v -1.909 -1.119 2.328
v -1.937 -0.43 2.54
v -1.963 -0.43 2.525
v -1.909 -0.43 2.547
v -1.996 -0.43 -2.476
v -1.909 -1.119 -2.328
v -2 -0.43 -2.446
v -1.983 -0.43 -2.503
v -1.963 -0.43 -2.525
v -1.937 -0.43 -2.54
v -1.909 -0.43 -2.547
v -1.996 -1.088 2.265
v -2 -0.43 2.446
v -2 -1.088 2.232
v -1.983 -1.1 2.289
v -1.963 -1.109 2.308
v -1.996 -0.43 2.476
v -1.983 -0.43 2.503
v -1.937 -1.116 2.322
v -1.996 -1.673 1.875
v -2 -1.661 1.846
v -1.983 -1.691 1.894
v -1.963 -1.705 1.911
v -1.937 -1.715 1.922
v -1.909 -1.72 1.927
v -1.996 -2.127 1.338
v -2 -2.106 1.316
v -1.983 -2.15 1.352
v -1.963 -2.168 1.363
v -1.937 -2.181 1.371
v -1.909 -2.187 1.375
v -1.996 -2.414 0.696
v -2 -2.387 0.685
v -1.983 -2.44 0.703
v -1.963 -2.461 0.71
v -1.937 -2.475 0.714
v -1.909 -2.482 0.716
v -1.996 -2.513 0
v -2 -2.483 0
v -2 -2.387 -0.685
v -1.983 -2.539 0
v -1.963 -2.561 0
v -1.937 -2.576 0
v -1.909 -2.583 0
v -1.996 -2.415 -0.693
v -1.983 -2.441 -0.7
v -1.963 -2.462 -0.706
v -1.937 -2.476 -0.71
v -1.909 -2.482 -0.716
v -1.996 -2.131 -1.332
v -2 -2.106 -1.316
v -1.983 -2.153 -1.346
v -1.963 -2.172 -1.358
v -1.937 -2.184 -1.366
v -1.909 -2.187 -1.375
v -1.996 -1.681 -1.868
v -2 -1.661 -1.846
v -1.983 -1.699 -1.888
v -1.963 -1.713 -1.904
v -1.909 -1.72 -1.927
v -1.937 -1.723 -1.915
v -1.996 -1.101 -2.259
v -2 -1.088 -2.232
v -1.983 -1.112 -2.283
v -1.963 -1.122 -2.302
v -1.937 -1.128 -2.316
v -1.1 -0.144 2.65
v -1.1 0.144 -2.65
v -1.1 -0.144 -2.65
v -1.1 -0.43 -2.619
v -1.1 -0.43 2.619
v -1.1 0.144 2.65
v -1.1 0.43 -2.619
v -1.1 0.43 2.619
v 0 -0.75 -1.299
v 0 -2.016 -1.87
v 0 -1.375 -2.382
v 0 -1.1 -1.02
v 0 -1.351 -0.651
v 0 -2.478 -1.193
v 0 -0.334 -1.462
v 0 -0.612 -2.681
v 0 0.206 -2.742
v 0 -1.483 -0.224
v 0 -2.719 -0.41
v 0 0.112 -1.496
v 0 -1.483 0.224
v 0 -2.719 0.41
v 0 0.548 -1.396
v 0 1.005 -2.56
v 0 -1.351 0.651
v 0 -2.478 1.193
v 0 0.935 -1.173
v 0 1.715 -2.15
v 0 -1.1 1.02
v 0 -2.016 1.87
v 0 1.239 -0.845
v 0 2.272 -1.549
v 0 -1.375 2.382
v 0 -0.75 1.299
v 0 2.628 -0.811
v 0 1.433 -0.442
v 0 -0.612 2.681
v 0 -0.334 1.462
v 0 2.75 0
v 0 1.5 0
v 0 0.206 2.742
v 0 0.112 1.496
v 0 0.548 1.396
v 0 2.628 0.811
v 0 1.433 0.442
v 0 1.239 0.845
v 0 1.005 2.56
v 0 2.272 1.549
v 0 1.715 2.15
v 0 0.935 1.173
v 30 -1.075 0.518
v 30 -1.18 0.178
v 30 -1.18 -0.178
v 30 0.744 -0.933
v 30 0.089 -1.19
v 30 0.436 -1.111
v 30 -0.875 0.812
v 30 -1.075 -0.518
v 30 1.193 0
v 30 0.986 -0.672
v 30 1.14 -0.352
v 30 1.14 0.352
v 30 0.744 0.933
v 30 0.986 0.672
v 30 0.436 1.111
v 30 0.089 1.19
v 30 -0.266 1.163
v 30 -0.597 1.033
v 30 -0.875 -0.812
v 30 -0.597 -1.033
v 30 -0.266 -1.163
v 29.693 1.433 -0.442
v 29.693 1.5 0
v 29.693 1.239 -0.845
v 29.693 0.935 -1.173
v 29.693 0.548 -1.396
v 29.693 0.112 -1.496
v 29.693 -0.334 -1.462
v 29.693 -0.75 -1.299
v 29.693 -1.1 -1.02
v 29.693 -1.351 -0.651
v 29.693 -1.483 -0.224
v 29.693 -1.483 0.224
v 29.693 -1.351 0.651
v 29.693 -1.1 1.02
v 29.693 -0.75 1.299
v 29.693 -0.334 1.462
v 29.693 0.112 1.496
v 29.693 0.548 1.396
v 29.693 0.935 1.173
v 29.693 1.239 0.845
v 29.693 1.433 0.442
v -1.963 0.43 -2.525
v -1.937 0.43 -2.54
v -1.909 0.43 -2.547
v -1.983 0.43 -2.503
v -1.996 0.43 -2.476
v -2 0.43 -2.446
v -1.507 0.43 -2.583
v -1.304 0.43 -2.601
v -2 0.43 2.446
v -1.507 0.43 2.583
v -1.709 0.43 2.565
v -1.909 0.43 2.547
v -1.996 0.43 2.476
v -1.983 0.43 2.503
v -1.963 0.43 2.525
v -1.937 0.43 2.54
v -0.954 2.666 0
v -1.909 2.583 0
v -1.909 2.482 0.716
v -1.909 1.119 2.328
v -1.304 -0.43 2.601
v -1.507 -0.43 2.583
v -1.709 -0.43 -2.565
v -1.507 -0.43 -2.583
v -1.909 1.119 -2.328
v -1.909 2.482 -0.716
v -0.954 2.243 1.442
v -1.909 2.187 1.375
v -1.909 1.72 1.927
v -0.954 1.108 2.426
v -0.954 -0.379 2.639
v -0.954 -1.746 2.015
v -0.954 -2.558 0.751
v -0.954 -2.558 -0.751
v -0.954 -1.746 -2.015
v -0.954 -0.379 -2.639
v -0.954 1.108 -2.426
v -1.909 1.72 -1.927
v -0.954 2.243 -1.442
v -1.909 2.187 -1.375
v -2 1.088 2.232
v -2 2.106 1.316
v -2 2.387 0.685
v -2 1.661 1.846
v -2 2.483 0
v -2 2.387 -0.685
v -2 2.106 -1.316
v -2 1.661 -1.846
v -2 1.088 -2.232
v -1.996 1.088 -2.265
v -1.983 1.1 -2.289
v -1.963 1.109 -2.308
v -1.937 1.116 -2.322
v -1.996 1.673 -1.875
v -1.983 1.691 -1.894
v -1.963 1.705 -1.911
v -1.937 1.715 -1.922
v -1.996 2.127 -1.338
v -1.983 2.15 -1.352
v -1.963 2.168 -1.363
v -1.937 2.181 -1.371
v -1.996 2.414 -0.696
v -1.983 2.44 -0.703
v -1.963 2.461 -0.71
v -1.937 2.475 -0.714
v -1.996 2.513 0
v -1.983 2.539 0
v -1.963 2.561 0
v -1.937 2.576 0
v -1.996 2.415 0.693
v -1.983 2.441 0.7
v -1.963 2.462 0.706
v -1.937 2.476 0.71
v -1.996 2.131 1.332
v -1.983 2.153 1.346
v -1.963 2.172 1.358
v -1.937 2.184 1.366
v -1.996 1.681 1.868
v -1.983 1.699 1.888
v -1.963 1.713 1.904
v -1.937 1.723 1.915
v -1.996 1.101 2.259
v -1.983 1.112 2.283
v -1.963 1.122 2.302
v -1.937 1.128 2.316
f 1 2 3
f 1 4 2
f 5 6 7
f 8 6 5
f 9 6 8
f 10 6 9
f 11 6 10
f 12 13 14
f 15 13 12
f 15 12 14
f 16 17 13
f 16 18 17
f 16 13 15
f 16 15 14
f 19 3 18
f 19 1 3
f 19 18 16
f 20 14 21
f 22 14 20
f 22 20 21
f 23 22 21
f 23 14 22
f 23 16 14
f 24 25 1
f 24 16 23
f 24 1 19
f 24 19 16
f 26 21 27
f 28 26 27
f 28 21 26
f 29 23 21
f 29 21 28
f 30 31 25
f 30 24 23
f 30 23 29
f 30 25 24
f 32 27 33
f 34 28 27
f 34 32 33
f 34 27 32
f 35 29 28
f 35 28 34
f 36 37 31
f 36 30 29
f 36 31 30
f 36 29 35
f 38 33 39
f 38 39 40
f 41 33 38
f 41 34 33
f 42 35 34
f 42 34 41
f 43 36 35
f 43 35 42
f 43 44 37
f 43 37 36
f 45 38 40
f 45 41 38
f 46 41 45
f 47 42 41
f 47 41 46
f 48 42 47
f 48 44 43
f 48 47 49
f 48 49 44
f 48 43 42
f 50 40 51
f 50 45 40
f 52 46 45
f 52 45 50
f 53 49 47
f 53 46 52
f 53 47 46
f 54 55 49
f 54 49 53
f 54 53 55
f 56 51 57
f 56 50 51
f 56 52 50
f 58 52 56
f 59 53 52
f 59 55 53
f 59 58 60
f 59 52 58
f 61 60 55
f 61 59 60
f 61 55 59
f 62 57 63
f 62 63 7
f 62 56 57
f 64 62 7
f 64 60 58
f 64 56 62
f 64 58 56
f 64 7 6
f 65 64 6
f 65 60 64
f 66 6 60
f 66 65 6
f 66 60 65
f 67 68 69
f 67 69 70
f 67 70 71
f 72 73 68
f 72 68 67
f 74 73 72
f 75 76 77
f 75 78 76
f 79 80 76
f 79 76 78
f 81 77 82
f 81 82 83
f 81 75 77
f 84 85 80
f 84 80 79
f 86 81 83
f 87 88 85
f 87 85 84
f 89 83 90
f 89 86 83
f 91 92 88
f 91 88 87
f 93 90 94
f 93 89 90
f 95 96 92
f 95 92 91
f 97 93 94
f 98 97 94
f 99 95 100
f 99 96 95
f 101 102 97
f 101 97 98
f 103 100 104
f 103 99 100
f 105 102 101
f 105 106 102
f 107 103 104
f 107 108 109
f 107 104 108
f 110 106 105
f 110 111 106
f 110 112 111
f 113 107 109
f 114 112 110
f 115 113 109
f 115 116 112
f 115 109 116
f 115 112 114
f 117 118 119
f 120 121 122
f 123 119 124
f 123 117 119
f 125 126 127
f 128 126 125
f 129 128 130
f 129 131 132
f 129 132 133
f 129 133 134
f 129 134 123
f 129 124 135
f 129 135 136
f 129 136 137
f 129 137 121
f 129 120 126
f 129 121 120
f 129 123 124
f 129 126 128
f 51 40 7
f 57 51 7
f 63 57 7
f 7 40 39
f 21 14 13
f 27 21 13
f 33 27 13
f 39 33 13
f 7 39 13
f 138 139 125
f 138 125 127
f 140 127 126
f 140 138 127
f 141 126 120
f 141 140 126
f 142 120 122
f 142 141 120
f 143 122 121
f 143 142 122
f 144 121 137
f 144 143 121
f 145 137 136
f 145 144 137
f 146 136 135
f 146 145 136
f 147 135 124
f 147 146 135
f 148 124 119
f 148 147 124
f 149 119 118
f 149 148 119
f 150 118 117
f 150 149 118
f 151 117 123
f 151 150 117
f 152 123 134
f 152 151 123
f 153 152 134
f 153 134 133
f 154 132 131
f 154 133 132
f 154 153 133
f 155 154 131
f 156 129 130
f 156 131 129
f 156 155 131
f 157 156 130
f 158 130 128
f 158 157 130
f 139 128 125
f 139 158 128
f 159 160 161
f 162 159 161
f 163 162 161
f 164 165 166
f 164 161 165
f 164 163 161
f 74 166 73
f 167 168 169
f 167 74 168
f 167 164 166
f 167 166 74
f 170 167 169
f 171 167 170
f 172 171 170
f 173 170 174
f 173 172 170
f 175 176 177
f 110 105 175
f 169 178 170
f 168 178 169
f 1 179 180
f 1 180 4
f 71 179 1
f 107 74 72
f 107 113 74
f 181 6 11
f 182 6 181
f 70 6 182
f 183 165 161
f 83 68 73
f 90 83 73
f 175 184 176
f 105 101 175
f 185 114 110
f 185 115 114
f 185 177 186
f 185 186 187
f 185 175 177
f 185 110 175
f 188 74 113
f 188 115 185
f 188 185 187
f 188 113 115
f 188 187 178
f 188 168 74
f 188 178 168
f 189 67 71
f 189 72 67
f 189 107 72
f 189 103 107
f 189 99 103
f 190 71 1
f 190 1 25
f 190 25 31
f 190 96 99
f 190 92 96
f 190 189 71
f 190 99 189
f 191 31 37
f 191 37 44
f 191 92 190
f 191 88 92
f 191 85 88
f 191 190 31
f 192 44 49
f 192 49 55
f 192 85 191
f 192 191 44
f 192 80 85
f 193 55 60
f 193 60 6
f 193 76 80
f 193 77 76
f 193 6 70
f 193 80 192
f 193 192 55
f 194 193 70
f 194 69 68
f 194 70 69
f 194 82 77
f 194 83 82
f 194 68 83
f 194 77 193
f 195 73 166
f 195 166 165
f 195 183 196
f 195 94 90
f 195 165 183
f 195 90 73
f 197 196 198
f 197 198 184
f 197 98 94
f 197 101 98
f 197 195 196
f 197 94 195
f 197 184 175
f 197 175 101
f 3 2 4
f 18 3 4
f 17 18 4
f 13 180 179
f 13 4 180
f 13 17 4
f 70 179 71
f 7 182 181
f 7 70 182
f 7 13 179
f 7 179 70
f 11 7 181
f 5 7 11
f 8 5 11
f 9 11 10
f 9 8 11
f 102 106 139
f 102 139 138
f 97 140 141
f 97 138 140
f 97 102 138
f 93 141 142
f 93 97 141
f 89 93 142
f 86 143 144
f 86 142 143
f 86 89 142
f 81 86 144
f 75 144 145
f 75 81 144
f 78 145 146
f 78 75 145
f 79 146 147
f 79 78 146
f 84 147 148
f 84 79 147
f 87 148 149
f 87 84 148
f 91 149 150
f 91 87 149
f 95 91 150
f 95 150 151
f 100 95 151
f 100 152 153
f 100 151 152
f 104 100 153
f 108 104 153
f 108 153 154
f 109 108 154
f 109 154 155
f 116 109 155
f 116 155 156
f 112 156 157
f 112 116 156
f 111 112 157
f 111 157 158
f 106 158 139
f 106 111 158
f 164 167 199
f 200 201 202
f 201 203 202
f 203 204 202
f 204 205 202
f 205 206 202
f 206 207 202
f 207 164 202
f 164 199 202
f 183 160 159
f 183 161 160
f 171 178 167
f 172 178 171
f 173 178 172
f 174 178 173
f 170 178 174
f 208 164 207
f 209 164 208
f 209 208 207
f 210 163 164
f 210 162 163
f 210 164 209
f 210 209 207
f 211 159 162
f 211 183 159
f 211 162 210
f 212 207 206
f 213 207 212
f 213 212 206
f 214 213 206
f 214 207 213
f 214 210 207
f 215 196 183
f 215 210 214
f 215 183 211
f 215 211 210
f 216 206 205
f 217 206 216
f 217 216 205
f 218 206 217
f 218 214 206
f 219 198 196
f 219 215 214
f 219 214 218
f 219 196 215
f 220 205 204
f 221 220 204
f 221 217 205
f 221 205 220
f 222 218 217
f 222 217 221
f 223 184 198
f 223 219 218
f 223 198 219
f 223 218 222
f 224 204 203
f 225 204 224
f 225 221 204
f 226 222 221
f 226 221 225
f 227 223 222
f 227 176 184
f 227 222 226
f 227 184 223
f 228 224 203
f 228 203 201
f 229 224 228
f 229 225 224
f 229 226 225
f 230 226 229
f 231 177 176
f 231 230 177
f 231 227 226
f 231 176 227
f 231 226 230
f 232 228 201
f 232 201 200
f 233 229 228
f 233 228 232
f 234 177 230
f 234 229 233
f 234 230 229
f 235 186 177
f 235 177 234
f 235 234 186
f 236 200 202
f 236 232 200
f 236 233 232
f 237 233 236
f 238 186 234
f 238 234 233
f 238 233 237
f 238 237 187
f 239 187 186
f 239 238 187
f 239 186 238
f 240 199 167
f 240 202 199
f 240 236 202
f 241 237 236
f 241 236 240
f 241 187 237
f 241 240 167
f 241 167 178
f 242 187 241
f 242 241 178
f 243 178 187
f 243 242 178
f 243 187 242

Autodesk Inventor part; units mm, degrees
ref_plane "YZ Plane" through (0, 0, 0) normal (1, 0, 0) x (0, 1, 0)
ref_plane "XZ Plane" through (0, 0, 0) normal (0, 1, 0) x (-1, 0, 0)
sketch "Esquisse1" plane through (0, 0, 0) normal (0, 0, 1) x (1, 0, 0)
  line L0 (-2, 0) -> (30, 0)
  line L1 (30, 0) -> (30, 1.5)
  line L2 (30, 1.5) -> (18, 1.5)
  line L3 (18, 1.5) -> (17.6932, 1.5)
  line L4 (17.6932, 1.5) -> (0, 1.5)
  line L5 (0, 1.5) -> (0, 2.75)
  line L6 (-8.4, 0) -> (36.4, 0) projected
  line L7 (0, -0.55) -> (0, 3.3) projected
  line L8 (-2, 0) -> (-2, 2.575)
  line L9 (0, 2.75) -> (-2, 2.575)
  line L10 (18, 1.5) -> (0, 1.5) construction
  dimension "d0" = 30
  dimension "d1" = 12
  dimension "d2" = 0.3068
  dimension "d3" = 2
  dimension "d4" = 3
  dimension "d5" = 3
  dimension "d9" = 5.5
  dimension "d10" = 5
revolve "Corps" add sketch "Esquisse1" angle 360 about axis through (-2, 0, 0) along (1, 0, 0)
sketch "Esquisse2" plane through (-2, 0, 0) normal (-1, 0, 0) x (0, 0, 1)
  circle A0 centre (0, 0) radius 2.75 projected
  line L0 (0, 0) -> (0, 2.575) projected
  line L1 (-2.75, 0.43) -> (2.75, 0.43)
  line L2 (2.75, 0.43) -> (2.75, -0.43)
  line L3 (2.75, -0.43) -> (-2.75, -0.43)
  line L4 (-2.75, -0.43) -> (-2.75, 0.43)
  line L5 (-2.75, 0) -> (2.75, 0) construction
  line L6 (0, 0.43) -> (0, -0.43) construction
  dimension "d11" = 0.86
  dimension "d12" = 5.5
fillet "Congé1" radius 0.1 1 edges at (-2, -2.575, 0)
extrude "Rainure" cut sketch "Esquisse2" against normal blind 0.9 contours A0 L3 L1 | L2 L3 A0 | A0 L1 L2 | A0 L4 L1 | L3 L4 A0
thread "Filetage" size "M3x0.5" class "6g" standard "ISO Metric profile" length 12
chamfer "Chanfrein1" distance 0.3067 distance2 0.3068 1 edges at (30, -1.5, 0) measured on face at (30, 0.3888, 0.4512)
ref_plane "Work Plane1" through (30.1625, 0, 0) normal (0, 0, -1) x (1, 0, 0)
equation "\"d11\" = SBR"
equation "\"d12\" = KOD"
equation "\"d14\" = RR"
equation "\"d19\" = STI"
equation "\"d15\" = GEL"
equation "\"d17\" = -0.5 * SPD + 0.5 * GD"
equation "\"d0\" = NLG"
equation "\"d1\" = GEL"
equation "\"d3\" = KOH"
equation "\"d4\" = GD"
equation "\"d5\" = BDM"
equation "\"d9\" = KOD"
equation "\"d10\" = KEWI"
equation "\"GD\" = NND"
equation "\"NLG\" = 30"
equation "\"GEL\" = 12"
equation "\"KOD\" = 5.5"
equation "\"KOH\" = 2"
equation "\"GAL\" = 0.61345 * PTC"
equation "\"SPD\" = NND - 1.2269 * PTC"
equation "\"BDM\" = NND"
equation "\"GUL\" = 0.61345 * PTC"
equation "\"RR\" = 0.1"
equation "\"SBR\" = 0.86"
equation "\"STI\" = 0.9"
equation "\"KEWI\" = 5deg"
equation "\"PTC\" = 0.5"
equation "\"THREADDIA\" = 3"
equation "\"TOA\" = 30deg"
equation "\"NND\" = 3"
equation "\"GD1\" = THREADDIA - 1.2269 * PTC"
properties part number "CSN 02 1131 - M3 x 30" material "Acier, doux"
